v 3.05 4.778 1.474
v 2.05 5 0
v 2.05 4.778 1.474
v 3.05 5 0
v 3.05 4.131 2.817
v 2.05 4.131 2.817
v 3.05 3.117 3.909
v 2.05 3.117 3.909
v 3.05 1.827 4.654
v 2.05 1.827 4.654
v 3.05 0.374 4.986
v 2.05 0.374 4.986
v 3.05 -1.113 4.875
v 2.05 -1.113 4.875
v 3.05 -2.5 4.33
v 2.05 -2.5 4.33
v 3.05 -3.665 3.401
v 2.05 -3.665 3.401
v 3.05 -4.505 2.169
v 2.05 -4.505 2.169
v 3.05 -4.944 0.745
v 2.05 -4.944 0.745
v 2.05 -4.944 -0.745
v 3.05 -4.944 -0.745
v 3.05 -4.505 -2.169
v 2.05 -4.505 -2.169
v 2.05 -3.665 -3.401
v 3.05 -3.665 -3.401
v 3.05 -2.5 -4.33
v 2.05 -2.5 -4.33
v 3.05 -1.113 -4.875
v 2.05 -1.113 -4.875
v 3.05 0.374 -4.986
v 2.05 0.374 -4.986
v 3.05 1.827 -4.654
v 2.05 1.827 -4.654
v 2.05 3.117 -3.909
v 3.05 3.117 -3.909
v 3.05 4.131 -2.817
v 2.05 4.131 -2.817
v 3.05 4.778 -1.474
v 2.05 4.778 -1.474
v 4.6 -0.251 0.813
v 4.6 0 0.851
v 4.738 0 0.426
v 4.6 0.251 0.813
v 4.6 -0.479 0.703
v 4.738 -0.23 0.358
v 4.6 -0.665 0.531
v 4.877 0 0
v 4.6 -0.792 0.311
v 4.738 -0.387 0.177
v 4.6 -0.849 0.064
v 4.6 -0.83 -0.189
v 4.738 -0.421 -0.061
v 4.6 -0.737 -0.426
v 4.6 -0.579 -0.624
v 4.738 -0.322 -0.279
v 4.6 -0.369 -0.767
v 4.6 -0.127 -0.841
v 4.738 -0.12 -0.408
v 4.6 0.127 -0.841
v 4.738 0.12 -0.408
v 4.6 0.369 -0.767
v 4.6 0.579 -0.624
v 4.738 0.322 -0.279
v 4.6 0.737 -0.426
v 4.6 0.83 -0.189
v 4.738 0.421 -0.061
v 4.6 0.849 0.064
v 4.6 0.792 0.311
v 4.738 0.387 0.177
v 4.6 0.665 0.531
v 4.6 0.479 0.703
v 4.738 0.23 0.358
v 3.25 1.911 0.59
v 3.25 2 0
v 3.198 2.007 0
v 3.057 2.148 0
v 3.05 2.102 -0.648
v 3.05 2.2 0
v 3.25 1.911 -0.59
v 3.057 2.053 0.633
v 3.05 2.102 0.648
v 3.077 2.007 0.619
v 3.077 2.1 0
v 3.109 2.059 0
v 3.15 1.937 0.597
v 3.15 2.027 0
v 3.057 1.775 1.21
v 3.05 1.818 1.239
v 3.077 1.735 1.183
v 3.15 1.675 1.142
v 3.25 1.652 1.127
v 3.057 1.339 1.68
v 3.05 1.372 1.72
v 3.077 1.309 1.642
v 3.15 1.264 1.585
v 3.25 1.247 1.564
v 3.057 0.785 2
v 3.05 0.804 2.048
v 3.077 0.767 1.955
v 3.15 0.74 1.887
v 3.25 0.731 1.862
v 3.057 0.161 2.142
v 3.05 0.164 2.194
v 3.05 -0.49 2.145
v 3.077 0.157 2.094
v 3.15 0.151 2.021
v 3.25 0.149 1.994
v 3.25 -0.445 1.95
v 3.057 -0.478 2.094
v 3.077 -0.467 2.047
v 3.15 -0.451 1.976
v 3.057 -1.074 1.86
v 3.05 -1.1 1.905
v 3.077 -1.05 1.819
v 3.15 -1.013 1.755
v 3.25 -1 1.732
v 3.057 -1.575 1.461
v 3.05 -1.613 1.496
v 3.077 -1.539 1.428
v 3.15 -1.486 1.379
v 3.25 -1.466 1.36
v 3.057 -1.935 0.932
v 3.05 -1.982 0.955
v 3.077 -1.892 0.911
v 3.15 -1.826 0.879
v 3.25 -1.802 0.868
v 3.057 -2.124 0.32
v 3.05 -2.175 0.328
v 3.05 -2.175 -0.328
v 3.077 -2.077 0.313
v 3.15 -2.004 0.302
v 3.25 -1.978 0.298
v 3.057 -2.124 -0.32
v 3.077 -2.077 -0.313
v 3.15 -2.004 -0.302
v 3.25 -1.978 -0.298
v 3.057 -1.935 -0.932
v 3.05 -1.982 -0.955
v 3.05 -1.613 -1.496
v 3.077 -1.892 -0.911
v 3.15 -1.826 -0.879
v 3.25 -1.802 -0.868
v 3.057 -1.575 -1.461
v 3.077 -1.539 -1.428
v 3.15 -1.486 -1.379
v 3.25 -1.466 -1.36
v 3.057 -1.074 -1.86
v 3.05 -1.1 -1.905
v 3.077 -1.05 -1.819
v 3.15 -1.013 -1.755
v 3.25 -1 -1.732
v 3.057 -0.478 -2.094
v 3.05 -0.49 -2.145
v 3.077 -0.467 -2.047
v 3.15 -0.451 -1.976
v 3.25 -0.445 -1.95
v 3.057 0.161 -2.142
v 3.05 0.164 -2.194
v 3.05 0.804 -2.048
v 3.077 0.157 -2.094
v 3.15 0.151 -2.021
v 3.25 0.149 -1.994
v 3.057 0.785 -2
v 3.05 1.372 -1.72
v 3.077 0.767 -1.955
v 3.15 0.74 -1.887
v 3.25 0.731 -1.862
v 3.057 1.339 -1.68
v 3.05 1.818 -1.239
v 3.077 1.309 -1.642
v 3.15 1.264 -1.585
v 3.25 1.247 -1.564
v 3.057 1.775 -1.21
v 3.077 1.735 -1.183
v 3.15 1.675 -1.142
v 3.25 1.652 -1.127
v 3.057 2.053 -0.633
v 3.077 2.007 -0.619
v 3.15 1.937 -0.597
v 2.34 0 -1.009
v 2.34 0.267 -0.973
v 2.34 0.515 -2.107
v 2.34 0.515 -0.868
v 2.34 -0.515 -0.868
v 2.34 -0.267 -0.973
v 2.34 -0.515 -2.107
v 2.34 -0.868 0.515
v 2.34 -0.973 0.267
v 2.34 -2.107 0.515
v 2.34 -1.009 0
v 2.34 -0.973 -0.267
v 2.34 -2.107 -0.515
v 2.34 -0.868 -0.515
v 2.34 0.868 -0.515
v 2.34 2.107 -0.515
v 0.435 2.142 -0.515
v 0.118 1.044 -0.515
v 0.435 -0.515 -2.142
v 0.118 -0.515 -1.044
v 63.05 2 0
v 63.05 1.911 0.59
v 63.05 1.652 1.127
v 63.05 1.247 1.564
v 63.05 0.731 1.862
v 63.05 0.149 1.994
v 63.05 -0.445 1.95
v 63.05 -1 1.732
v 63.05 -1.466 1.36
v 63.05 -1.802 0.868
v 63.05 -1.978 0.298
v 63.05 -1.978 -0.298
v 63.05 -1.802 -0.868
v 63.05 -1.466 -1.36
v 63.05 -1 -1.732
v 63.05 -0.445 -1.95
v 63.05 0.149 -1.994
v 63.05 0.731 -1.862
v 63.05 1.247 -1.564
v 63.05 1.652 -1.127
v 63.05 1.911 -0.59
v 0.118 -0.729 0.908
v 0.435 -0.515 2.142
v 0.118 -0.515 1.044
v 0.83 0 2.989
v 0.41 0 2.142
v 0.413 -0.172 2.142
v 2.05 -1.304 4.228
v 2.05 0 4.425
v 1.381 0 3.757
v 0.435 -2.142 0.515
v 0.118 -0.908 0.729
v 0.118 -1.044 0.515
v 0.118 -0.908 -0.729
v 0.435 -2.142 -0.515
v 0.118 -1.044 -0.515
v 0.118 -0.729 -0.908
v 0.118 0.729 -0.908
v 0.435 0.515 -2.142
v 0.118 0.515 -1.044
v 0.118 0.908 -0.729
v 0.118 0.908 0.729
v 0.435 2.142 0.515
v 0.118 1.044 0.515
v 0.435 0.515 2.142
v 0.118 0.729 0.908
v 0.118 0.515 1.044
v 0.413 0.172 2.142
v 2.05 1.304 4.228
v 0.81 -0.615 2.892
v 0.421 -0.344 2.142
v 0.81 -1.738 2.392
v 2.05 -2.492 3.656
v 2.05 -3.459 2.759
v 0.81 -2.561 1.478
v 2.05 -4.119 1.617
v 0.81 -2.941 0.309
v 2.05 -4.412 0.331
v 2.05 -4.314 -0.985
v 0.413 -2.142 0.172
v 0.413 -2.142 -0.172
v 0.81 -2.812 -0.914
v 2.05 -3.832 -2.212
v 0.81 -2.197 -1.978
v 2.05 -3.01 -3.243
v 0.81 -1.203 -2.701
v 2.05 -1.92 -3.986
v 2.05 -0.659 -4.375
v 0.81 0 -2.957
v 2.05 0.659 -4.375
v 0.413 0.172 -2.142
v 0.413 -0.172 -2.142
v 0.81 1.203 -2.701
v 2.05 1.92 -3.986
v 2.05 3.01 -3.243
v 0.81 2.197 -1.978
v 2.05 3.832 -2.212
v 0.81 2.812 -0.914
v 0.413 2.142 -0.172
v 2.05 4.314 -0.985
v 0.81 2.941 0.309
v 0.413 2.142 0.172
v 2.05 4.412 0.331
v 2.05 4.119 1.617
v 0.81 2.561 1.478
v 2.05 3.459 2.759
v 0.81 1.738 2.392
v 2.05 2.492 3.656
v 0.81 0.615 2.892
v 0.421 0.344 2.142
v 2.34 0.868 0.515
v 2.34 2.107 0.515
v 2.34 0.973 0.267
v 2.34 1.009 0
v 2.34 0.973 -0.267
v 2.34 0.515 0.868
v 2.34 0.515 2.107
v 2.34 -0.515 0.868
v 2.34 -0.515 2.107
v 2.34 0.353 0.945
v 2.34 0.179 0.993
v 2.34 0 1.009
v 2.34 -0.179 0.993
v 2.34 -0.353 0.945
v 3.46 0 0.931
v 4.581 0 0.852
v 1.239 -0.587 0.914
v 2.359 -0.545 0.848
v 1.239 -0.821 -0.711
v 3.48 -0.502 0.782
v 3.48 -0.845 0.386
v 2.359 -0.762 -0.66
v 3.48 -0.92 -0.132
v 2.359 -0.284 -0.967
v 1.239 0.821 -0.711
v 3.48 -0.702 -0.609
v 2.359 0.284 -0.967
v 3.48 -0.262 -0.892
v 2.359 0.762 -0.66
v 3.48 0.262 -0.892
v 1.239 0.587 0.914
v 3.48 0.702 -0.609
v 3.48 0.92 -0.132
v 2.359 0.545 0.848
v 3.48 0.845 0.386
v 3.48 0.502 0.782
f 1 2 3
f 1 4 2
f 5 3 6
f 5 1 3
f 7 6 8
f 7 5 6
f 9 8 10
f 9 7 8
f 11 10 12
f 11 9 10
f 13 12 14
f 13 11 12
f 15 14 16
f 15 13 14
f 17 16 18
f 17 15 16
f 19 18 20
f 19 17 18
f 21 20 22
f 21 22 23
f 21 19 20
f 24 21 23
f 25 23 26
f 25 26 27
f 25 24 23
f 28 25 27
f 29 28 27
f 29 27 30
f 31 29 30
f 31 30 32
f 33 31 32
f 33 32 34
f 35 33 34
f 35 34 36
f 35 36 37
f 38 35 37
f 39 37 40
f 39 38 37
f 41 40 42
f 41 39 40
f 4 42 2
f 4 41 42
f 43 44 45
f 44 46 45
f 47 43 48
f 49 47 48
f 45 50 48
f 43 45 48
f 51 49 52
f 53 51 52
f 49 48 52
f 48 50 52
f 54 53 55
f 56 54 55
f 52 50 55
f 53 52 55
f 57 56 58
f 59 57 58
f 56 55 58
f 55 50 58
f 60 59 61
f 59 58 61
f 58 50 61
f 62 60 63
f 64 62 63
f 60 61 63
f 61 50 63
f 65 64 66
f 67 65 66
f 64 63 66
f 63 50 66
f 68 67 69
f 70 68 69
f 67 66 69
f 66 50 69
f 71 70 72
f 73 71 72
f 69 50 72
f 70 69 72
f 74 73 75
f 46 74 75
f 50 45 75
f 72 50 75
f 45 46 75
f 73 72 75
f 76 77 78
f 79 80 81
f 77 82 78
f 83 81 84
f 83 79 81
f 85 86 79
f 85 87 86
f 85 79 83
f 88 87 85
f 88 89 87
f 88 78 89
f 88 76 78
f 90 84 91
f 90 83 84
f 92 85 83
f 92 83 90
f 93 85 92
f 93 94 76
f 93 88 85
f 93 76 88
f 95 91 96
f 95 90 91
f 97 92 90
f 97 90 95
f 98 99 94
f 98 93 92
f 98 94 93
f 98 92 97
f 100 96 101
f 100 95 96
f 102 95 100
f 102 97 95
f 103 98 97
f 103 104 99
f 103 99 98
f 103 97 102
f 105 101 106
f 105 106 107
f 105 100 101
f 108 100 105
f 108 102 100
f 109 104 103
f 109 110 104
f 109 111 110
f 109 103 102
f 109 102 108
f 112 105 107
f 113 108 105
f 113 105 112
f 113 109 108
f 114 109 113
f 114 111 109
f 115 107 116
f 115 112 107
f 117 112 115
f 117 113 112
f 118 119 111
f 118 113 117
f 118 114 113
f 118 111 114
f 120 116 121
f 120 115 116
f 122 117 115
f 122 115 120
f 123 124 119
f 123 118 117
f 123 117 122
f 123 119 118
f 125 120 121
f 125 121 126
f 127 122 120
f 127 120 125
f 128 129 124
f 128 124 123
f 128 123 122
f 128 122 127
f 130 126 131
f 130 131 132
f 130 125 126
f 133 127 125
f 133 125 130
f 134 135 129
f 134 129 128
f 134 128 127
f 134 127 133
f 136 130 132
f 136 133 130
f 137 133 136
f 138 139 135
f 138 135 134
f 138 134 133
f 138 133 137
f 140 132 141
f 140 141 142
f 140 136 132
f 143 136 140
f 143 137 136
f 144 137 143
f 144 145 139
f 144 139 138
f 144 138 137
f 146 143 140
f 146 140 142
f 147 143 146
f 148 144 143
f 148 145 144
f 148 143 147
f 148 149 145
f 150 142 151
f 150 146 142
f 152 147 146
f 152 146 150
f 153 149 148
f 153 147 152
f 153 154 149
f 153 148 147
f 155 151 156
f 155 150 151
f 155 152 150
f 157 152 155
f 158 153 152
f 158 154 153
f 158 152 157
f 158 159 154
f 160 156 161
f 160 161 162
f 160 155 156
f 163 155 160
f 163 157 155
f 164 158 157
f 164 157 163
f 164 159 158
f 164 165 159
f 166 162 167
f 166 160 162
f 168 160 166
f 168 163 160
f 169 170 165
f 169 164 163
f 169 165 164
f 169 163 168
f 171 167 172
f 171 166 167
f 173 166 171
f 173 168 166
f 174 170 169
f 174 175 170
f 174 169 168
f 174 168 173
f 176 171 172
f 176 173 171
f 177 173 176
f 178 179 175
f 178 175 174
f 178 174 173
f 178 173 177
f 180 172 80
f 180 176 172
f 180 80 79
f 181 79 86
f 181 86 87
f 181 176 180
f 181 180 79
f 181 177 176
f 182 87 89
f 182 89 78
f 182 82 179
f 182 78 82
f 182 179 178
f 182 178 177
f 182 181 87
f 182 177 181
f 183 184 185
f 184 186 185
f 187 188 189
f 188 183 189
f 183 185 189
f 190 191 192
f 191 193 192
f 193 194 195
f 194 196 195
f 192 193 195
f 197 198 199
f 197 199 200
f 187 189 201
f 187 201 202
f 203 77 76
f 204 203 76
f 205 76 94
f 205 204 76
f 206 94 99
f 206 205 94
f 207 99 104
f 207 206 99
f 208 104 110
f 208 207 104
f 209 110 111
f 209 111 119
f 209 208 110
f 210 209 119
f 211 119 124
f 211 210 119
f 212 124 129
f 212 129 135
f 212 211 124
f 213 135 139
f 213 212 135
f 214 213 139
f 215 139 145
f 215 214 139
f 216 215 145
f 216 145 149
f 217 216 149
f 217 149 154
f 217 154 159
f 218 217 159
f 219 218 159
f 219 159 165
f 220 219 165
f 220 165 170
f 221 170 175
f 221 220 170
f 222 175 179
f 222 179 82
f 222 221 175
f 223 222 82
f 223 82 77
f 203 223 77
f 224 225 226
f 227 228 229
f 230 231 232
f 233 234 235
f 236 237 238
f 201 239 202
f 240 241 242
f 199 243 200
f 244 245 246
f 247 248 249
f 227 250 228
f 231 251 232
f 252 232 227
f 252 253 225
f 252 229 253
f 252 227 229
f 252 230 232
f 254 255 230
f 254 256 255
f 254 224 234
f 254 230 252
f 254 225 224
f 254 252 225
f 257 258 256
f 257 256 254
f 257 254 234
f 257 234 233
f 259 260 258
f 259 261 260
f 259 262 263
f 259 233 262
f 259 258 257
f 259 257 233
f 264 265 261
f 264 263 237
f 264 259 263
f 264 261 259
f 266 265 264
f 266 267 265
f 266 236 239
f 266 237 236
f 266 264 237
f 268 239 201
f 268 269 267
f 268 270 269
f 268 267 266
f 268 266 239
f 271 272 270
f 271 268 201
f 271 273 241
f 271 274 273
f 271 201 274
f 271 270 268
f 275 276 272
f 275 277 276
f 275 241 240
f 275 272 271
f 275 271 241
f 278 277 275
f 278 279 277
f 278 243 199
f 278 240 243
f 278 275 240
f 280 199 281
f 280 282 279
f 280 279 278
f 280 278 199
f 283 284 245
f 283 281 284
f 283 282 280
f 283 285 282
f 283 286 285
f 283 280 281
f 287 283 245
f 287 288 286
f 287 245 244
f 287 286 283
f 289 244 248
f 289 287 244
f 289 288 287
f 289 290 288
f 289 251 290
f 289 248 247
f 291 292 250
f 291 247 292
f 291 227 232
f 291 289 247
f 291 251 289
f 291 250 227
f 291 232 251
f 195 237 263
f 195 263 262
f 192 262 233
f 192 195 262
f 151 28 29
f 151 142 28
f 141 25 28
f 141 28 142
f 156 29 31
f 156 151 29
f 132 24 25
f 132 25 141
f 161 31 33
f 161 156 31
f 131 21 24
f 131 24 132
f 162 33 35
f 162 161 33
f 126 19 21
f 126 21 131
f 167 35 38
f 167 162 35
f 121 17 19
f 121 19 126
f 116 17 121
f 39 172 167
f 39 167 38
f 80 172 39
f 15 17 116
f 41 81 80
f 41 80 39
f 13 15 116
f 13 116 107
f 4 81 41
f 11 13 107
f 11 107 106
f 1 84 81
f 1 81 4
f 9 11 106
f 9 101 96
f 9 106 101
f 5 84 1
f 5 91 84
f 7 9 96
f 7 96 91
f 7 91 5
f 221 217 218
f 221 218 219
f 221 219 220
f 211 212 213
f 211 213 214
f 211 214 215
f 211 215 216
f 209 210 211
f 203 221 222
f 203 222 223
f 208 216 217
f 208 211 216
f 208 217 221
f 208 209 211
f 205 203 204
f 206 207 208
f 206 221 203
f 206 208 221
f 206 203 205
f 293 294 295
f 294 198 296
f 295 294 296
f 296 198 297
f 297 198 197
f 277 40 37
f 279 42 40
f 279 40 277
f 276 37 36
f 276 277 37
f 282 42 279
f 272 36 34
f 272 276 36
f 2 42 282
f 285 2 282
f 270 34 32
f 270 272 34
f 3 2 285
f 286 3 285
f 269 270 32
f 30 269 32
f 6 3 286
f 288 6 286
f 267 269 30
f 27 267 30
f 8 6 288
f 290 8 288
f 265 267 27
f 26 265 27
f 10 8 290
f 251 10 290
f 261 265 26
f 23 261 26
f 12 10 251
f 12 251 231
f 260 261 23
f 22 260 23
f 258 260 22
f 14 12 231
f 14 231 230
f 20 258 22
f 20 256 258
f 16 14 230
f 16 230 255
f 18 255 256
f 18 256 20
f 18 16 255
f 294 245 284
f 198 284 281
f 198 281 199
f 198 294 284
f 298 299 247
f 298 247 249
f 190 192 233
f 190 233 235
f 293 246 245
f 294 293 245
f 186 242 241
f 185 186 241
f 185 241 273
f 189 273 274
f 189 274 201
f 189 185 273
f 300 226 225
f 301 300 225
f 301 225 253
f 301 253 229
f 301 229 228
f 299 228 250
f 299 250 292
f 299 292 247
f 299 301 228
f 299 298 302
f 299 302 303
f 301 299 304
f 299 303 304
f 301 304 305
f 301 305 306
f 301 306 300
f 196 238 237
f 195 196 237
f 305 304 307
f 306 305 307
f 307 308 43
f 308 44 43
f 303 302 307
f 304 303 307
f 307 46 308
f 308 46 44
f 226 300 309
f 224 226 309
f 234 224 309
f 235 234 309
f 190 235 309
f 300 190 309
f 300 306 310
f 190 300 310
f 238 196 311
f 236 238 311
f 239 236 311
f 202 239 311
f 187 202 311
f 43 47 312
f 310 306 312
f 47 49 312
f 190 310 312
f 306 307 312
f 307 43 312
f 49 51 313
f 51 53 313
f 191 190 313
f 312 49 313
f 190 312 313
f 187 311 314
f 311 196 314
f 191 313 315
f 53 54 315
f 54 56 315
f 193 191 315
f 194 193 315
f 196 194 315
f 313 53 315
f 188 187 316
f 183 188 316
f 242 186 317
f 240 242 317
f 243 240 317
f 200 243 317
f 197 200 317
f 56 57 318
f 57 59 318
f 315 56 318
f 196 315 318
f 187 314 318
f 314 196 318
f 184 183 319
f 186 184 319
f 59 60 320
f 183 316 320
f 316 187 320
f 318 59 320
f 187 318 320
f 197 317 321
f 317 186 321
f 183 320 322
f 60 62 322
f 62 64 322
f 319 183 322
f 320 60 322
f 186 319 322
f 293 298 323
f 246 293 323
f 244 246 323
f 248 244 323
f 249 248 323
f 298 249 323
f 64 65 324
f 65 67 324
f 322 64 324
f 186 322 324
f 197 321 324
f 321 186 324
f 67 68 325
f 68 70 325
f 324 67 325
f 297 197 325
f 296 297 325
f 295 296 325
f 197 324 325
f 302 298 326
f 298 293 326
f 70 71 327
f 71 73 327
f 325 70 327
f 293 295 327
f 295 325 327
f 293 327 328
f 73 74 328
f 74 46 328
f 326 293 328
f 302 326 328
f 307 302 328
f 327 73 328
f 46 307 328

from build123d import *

# Parameters (mm, degrees)
RECPAT_COUNT = 2
RECPAT_ANGLE = 90


with BuildPart() as part:
    # Fillet1: read off the stored shape, not the designer's step
    # Fillet1 outline → Fillet1 (revolve)
    with BuildSketch(Plane.YX):
        with BuildLine():
            Line((2, 3.25), (2, 63.05))
            Line((2, 63.05), (0, 63.05))
            Line((0, 63.05), (0, 2.05))
            Line((0, 2.05), (5, 2.05))
            Line((5, 2.05), (5, 3.05))
            Line((5, 3.05), (2.2, 3.05))
            ThreePointArc((2.2, 3.05), (2.058578644, 3.108578644), (2, 3.25))
        make_face()
    revolve(axis=Axis((0, 0, 0), (1, 0, 0)))

    # PanSke → Pan (revolve)
    with BuildSketch(Plane.XY, mode=Mode.PRIVATE) as pan_sk:
        with BuildLine():
            Line((2.05, 4.424646879), (2.05, 0))
            Line((2.05, 0), (0, 0))
            ThreePointArc((0, 0), (0.537396082, 2.438237068), (2.05, 4.424646879))
        make_face()
    revolve(pan_sk.sketch.rotate(Axis((0, 0, 0), (1, 0, 0)), 90), axis=Axis((0, 0, 0), (1, 0, 0)))

    # Sketch3 → Recess section 0
    with BuildSketch(Plane(origin=(0, 0, 0), x_dir=(0, 0, -1), z_dir=(1, 0, 0))):
        with BuildLine():
            Line((-0.515, 2.15), (0.515, 2.15))
            Line((0.515, 2.15), (0.515, -2.15))
            Line((0.515, -2.15), (-0.515, -2.15))
            Line((-0.515, -2.15), (-0.515, 2.15))
        make_face()
    # Sketch4 → Recess section 1
    with BuildSketch(Plane(origin=(2.34, 0, 0), x_dir=(0, 0, -1), z_dir=(1, 0, 0))):
        with BuildLine():
            Line((-0.515, 2.106524682), (0.515, 2.106524682))
            Line((0.515, 2.106524682), (0.515, -2.106524682))
            Line((0.515, -2.106524682), (-0.515, -2.106524682))
            Line((-0.515, -2.106524682), (-0.515, 2.106524682))
        make_face()
    recess = loft(mode=Mode.SUBTRACT)

    # RecPat: Recess ×2 about axis
    recpat_axis = Axis((0, 0, 0), (1, 0, 0))
    for i in range(1, RECPAT_COUNT):
        add(recess.rotate(recpat_axis, i * RECPAT_ANGLE / (RECPAT_COUNT - 1)), mode=Mode.SUBTRACT)

    # RecCorSke → RecessCore (revolve, cut)
    with BuildSketch(Plane.XY, mode=Mode.PRIVATE) as recesscore_sk:
        Polygon((0, 0), (0, 1.172663335), (4.6, 0.851), (4.876506661, 0), align=None)
    revolve(recesscore_sk.sketch.rotate(Axis((-3.175, 0, 0), (1, 0, 0)), 90), axis=Axis((-3.175, 0, 0), (1, 0, 0)), mode=Mode.SUBTRACT)


solid = part.part
